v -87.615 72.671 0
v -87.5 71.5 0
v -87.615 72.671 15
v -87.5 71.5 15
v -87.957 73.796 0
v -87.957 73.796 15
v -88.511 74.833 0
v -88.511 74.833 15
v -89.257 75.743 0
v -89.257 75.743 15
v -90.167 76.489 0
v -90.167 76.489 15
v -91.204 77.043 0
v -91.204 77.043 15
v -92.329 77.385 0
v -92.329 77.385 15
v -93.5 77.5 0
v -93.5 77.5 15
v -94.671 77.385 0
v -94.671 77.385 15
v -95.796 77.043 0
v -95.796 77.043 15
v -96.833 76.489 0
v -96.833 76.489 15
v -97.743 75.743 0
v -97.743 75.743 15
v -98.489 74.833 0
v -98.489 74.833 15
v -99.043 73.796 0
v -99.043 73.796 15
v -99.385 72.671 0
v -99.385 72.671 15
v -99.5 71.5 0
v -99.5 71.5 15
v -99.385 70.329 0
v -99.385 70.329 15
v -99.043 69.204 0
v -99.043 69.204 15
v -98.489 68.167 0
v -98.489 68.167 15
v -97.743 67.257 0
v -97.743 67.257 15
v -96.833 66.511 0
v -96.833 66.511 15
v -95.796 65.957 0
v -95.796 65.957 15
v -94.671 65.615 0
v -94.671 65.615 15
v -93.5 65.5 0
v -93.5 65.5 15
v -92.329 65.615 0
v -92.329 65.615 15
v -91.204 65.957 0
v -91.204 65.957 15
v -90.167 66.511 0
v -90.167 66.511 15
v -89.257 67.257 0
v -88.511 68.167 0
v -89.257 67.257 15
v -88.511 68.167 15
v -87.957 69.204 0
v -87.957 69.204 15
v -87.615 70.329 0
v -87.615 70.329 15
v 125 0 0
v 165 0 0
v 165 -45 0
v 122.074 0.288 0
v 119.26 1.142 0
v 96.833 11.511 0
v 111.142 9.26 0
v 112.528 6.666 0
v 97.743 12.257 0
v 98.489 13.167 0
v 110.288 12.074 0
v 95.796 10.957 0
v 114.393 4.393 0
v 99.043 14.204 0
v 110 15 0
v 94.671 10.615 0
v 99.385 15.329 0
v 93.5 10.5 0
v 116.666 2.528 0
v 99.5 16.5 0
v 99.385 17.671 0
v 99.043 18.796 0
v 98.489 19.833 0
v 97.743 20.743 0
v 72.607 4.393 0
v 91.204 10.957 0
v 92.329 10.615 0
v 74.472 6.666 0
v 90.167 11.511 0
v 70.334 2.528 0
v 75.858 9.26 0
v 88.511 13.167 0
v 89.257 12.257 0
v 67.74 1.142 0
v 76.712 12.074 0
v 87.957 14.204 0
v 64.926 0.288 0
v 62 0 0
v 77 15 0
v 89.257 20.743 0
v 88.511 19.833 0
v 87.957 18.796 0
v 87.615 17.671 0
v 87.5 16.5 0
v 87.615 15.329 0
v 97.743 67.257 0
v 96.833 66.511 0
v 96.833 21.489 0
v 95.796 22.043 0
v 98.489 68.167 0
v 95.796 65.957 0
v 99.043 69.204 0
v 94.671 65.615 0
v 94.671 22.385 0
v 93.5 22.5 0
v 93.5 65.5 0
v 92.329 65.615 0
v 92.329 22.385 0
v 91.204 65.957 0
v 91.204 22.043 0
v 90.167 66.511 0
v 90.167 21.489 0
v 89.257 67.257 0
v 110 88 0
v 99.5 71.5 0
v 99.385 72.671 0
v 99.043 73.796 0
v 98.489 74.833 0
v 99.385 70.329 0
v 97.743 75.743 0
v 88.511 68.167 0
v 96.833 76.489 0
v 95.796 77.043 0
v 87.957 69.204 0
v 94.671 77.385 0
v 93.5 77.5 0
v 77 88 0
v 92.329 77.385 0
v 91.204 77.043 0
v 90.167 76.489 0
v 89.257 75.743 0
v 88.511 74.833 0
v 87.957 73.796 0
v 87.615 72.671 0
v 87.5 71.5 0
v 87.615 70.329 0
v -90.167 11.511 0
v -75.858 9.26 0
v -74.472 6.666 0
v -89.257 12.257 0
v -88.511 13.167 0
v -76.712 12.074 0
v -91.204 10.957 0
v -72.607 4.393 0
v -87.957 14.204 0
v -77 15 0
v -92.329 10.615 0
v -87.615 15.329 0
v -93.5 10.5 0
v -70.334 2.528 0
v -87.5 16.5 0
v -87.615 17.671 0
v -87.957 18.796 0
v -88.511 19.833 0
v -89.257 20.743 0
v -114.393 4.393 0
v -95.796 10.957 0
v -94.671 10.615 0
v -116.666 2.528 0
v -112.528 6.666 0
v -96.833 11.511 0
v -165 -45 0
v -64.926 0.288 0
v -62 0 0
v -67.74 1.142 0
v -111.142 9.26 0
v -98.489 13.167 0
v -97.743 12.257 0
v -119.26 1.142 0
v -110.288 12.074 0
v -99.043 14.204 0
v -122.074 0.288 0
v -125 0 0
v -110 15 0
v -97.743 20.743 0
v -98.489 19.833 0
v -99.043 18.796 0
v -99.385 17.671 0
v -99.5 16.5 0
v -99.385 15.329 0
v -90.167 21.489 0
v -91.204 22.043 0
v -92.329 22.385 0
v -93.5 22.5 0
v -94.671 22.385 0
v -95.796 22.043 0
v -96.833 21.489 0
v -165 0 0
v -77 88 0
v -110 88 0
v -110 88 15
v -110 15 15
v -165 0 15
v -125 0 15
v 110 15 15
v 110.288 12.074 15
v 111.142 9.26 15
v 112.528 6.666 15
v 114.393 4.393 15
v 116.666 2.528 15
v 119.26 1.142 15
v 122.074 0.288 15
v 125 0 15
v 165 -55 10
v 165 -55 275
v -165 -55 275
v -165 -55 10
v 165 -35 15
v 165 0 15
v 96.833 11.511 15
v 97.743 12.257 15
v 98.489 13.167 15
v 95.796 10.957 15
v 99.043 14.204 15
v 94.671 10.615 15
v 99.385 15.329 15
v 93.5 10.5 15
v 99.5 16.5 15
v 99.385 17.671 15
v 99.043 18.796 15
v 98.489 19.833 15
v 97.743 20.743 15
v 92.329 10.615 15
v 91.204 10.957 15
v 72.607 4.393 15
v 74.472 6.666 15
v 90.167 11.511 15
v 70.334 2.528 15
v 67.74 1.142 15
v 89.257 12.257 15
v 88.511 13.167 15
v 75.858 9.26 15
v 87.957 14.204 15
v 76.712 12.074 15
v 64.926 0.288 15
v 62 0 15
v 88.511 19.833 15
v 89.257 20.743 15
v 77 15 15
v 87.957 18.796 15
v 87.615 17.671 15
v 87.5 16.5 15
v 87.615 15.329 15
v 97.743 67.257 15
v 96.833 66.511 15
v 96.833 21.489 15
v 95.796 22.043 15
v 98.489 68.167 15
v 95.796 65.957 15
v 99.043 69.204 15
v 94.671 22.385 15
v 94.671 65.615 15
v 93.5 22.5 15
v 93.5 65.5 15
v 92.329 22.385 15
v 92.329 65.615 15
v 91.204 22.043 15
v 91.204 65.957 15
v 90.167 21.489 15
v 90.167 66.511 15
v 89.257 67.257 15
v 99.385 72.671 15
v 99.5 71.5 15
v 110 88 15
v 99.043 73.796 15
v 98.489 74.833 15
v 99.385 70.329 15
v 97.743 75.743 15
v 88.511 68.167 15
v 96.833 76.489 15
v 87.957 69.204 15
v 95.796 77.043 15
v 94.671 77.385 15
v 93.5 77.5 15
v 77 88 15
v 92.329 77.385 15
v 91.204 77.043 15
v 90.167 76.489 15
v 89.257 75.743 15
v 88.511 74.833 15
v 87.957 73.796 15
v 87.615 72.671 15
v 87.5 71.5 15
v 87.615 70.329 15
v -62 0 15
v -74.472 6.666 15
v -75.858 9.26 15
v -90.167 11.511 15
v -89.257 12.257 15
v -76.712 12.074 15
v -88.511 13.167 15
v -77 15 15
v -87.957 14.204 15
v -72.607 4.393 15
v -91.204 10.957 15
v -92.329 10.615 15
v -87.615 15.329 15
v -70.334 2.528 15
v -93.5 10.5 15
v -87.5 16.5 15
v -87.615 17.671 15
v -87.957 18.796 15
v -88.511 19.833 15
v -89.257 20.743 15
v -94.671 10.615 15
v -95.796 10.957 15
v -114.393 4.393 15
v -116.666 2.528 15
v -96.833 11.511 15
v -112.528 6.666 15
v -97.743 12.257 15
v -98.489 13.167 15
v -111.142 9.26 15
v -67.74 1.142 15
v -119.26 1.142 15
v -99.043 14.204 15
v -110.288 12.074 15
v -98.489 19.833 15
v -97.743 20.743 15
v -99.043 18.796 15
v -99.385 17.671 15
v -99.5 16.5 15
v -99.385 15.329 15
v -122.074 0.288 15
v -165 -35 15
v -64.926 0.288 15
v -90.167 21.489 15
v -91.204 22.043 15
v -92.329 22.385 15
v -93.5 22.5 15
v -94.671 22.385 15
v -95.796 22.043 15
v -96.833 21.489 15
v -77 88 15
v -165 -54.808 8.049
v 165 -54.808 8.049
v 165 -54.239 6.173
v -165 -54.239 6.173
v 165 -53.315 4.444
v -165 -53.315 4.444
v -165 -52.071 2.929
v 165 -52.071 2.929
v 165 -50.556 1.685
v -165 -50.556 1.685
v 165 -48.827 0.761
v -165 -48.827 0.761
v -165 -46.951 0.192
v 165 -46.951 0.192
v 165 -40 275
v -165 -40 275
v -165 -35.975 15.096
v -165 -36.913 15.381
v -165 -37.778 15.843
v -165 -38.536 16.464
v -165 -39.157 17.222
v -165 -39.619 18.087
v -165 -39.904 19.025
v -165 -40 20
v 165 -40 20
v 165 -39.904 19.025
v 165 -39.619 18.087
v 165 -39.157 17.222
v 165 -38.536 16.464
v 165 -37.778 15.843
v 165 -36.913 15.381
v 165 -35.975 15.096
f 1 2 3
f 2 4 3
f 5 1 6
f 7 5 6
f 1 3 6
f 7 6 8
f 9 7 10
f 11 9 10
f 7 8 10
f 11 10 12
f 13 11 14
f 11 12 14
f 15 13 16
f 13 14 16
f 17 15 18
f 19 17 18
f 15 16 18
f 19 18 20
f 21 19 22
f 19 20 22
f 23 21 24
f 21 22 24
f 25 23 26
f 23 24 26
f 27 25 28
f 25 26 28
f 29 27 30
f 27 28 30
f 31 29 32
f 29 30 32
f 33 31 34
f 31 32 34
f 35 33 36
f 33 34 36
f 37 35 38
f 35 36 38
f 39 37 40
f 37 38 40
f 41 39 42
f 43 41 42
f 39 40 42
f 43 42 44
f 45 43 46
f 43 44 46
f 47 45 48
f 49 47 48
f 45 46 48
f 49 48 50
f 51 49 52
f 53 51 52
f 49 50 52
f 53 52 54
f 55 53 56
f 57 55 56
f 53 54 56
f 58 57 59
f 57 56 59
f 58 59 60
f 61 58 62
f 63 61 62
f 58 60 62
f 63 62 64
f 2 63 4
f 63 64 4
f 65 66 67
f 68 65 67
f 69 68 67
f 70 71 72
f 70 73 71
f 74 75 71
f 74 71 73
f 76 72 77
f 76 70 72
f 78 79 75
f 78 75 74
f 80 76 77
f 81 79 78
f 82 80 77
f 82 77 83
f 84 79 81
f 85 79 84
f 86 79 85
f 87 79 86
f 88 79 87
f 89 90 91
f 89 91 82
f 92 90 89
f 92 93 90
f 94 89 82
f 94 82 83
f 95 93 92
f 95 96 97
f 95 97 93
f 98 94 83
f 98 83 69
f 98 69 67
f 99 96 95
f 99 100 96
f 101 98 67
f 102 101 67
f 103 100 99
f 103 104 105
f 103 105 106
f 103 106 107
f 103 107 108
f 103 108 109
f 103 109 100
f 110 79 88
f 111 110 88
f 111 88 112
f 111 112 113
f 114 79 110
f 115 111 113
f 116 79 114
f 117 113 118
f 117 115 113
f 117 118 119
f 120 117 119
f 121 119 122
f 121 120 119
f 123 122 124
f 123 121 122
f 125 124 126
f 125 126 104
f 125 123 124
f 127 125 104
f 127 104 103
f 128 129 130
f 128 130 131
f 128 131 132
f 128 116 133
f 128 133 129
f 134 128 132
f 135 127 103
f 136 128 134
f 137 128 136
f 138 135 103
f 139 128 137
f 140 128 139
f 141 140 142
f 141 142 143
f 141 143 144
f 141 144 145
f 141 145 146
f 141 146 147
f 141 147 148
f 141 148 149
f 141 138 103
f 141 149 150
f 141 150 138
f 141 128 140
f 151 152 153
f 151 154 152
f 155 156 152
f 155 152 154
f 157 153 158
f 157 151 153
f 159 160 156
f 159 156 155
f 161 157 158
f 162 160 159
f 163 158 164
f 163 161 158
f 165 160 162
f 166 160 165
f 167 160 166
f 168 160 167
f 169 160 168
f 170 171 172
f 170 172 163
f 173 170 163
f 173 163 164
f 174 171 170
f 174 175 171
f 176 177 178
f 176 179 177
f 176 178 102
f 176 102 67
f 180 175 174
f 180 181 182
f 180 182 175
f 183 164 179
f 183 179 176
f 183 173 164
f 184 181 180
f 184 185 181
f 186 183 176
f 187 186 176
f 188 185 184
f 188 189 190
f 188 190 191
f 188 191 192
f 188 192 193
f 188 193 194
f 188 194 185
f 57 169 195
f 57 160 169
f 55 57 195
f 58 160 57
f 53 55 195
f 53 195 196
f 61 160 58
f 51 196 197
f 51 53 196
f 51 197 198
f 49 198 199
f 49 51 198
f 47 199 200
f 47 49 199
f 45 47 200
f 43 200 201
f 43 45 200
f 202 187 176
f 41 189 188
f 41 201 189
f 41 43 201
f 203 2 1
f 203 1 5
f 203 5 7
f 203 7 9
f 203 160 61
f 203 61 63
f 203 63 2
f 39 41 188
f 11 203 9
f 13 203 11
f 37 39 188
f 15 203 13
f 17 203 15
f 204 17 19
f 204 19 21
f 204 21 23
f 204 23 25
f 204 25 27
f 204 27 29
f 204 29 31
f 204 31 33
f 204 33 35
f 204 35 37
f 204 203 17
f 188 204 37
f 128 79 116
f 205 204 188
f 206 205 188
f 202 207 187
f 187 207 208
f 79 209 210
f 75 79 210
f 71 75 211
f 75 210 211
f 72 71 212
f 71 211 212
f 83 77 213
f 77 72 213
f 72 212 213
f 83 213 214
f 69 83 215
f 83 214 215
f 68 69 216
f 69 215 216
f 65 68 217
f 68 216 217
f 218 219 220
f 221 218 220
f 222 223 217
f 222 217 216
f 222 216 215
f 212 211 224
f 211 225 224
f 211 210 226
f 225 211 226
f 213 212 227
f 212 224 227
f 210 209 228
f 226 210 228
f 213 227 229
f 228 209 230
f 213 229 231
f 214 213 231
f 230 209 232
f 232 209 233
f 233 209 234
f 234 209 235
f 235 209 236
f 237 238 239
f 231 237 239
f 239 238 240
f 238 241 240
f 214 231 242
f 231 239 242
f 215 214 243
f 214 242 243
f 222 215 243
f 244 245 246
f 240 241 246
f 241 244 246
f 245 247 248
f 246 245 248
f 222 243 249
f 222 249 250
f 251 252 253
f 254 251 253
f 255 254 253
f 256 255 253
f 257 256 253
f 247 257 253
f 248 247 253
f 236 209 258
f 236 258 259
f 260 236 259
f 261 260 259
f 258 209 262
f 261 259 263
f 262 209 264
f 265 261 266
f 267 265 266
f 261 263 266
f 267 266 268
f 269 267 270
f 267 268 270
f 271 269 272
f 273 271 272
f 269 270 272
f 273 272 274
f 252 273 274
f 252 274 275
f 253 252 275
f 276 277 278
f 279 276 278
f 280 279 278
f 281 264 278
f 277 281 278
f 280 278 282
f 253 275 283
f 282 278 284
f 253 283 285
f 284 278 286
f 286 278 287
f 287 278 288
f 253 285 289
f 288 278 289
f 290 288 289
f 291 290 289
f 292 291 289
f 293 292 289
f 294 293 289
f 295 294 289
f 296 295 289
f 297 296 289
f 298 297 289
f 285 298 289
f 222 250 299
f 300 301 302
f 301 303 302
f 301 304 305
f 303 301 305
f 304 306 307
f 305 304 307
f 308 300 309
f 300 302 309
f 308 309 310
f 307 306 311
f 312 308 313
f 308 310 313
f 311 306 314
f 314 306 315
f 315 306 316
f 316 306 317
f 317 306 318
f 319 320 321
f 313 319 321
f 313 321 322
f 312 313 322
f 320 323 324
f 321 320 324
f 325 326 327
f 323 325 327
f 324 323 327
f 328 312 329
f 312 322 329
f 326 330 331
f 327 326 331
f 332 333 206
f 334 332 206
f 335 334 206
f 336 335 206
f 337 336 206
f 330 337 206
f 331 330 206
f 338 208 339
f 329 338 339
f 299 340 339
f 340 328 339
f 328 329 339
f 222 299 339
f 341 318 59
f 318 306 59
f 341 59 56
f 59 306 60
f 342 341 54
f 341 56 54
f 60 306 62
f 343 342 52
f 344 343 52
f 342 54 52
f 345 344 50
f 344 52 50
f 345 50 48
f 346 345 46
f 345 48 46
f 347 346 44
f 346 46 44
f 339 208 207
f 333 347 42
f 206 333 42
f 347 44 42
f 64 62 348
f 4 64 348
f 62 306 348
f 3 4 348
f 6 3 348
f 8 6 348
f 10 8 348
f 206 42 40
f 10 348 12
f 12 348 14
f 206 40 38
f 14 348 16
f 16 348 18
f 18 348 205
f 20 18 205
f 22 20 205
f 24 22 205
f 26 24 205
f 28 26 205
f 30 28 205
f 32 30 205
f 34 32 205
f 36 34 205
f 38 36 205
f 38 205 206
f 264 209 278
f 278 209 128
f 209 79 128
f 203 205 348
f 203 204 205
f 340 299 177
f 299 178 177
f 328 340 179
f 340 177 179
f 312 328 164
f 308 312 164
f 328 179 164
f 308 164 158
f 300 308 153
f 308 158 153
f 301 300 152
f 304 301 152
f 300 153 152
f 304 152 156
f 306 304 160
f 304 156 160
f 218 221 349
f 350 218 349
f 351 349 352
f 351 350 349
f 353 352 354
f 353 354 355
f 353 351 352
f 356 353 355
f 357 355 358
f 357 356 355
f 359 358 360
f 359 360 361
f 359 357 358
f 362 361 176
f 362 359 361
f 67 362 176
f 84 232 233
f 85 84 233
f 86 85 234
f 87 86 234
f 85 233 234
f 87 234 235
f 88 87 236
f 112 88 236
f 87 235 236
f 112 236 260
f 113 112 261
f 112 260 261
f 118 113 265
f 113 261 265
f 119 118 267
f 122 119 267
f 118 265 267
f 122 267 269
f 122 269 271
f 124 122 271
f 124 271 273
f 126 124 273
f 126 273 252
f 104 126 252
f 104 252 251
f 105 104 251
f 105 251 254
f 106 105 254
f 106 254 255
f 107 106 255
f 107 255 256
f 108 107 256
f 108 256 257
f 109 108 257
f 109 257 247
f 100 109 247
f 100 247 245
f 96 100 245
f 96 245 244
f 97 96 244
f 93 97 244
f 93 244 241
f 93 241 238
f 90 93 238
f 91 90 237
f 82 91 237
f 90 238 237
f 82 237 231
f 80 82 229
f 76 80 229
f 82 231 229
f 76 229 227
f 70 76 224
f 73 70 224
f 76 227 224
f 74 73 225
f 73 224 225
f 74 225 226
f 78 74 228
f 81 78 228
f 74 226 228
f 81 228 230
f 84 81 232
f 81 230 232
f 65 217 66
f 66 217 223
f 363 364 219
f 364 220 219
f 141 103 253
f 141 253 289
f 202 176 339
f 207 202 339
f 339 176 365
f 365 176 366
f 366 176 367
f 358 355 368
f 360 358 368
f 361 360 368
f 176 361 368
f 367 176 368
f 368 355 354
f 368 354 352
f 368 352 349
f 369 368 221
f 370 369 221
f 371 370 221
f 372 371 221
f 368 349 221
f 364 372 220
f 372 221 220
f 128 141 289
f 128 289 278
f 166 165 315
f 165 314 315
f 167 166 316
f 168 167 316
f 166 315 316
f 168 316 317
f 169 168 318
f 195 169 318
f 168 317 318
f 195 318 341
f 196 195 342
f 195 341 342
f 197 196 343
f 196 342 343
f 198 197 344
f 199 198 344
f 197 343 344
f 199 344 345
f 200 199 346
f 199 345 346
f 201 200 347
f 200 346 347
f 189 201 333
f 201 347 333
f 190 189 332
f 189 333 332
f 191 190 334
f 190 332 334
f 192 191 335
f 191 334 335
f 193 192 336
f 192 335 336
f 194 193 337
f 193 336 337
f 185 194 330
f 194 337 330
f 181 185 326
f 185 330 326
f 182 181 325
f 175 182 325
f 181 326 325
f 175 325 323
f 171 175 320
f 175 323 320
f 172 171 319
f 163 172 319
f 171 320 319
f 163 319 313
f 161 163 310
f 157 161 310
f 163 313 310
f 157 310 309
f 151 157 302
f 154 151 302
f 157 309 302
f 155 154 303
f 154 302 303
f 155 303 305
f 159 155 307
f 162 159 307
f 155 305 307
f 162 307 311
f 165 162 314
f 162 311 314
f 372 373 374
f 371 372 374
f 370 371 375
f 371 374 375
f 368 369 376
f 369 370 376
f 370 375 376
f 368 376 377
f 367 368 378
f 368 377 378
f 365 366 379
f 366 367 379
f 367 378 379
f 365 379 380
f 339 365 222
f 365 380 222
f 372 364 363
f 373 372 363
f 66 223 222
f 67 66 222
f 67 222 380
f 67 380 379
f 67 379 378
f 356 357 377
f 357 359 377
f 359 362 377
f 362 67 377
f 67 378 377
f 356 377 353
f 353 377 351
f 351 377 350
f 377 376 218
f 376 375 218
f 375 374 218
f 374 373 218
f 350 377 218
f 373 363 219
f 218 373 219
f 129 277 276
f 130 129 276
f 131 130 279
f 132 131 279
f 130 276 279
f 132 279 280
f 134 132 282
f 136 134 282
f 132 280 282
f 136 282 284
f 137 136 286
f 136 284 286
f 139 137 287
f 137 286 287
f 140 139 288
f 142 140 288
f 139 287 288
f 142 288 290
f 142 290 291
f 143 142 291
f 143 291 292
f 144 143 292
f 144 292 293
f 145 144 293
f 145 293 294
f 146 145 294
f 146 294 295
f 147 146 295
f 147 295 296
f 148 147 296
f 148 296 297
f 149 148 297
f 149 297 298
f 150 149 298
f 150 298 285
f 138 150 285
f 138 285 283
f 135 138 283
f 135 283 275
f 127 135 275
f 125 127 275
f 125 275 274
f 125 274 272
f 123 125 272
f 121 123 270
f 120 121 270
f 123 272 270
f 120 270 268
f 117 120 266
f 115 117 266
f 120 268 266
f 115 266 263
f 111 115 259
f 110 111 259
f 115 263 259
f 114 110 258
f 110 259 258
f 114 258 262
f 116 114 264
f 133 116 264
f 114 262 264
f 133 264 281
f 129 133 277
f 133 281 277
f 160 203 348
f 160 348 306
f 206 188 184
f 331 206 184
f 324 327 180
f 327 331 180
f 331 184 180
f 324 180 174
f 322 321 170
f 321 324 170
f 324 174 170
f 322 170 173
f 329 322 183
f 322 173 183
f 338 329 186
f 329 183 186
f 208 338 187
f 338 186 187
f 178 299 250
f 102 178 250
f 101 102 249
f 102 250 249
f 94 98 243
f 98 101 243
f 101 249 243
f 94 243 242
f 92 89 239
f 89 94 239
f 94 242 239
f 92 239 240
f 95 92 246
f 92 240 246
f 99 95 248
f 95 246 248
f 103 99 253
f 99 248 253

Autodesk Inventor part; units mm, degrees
ref_plane "YZ Plane" through (0, 0, 0) normal (1, 0, 0) x (0, 1, 0)
ref_plane "XZ Plane" through (0, 0, 0) normal (0, 1, 0) x (-1, 0, 0)
ref_plane "XY Plane" through (0, 0, 0) normal (0, 0, 1) x (1, 0, 0)
sketch "草圖1" plane through (0, 0, 0) normal (0, 0, 1) x (1, 0, 0)
  line L0 (0, 0) -> (0, 117.5667) construction
  line L1 (-139.2449, 0) -> (139.2449, 0) construction
  line L2 (-110, 88) -> (-77, 88)
  line L3 (-77, 88) -> (-77, 0)
  line L4 (-77, 0) -> (-110, 0)
  line L5 (-110, 0) -> (-110, 88)
  line L6 (77, 88) -> (110, 88)
  line L7 (110, 88) -> (110, 0)
  line L8 (110, 0) -> (77, 0)
  line L9 (77, 0) -> (77, 88)
  line L10 (-110, 0) -> (-77, 0)
  line L11 (-77, 0) -> (-77, -55)
  line L12 (-77, -55) -> (-110, -55)
  line L13 (-110, -55) -> (-110, 0)
  line L14 (77, 0) -> (110, 0)
  line L15 (110, 0) -> (110, -55)
  line L16 (110, -55) -> (77, -55)
  line L17 (77, -55) -> (77, 0)
  dimension "d0" = 33
  dimension "d1" = 33
  dimension "d2" = 220
  dimension "d3" = 110
  dimension "d4" = 88
  dimension "d5" = 88
  dimension "d6" = 55
  dimension "d7" = 55
extrude "擠出1" add sketch "草圖1" along normal blind 15
sketch "草圖2" plane through (0, 0, 15) normal (0, 0, 1) x (1, 0, 0)
  line L0 (-77, -55) -> (-110, -55) construction
  line L1 (-110, -55) -> (-110, 88) construction
  line L2 (-110, 88) -> (-77, 88) construction
  line L3 (-77, 88) -> (-77, -55) construction
  line L4 (77, 88) -> (110, 88) construction
  line L5 (110, 88) -> (110, -55) construction
  line L6 (110, -55) -> (77, -55) construction
  line L7 (77, -55) -> (77, 88) construction
  line L8 (-110, -55) -> (110, -55)
  line L9 (110, -55) -> (110, -40)
  line L10 (110, -40) -> (-110, -40)
  line L11 (-110, -40) -> (-110, -55)
  point P0 (0, 0)
  dimension "d10" = 15
extrude "擠出2" add sketch "草圖2" along normal blind 260
sketch "草圖3" plane through (0, 0, 15) normal (0, 0, 1) x (1, 0, 0)
  circle A0 centre (-93.5, 71.5) radius 6
  circle A1 centre (-93.5, 16.5) radius 6
  circle A2 centre (93.5, 71.5) radius 6
  circle A3 centre (93.5, 16.5) radius 6
  line L0 (110, 88) -> (77, 88) construction
  line L1 (-77, 88) -> (-110, 88) construction
  line L2 (-93.5, 88) -> (-93.5, -40) construction
  line L3 (-110, -40) -> (-77, -40) construction
  line L4 (93.5, 88) -> (93.5, -40) construction
  line L5 (110, -40) -> (-110, -40) construction
  point P0 (0, 0)
  dimension "d13" = 55
  dimension "d14" = 12
  dimension "d15" = 12
  dimension "d16" = 12
  dimension "d17" = 12
  dimension "d18" = 55
  dimension "d19" = 16.5
  dimension "d20" = 16.5
extrude "擠出3" cut sketch "草圖3" against normal blind 200
sketch "草圖4" plane through (-110, -55, 0) normal (0, -1, 0) x (1, 0, 0)
  line L0 (187, 15) -> (33, 15) construction
  line L1 (33, 15) -> (33, 0) construction
  line L2 (33, 0) -> (0, 0) construction
  line L3 (0, 0) -> (0, 275) construction
  line L4 (0, 275) -> (220, 275) construction
  line L5 (220, 275) -> (220, 0) construction
  line L6 (220, 0) -> (187, 0) construction
  line L7 (187, 0) -> (187, 15) construction
  line L8 (-55, 275) -> (275, 275)
  line L9 (275, 275) -> (275, 15)
  line L10 (275, 15) -> (-55, 15)
  line L11 (-55, 15) -> (-55, 275)
  point P0 (110, 0)
  point P1 (110, 275)
  point P2 (110, 15)
  dimension "d23" = 55
extrude "擠出4" add sketch "草圖4" against normal blind 15
sketch "草圖5" plane through (0, 0, 15) normal (0, 0, -1) x (-1, 0, 0)
  circle A0 centre (-93.5, 71.5) radius 6 construction
  circle A1 centre (93.5, 71.5) radius 6 construction
  circle A2 centre (-93.5, 16.5) radius 6 construction
  circle A3 centre (93.5, 16.5) radius 6 construction
  line L0 (-110, 88) -> (-77, 88) construction
  line L1 (-77, 88) -> (-77, -40) construction
  line L2 (-77, -40) -> (77, -40) construction
  line L3 (77, -55) -> (77, -40) construction
  line L4 (77, -55) -> (-77, -55) construction
  line L5 (-77, -55) -> (-110, -55) construction
  line L6 (-110, -55) -> (-110, -40) construction
  line L7 (-110, -40) -> (-77, -40) construction
  line L8 (-110, -40) -> (-110, 88) construction
  line L9 (-165, -40) -> (-110, -40) construction
  line L10 (-165, -55) -> (-165, -40) construction
  line L11 (-110, -55) -> (-165, -55) construction
  line L12 (-77, -40) -> (-77, -55) construction
  line L13 (77, -40) -> (110, -40) construction
  line L14 (110, -40) -> (110, -55) construction
  line L15 (165, -55) -> (110, -55) construction
  line L16 (165, -40) -> (165, -55) construction
  line L17 (110, -40) -> (165, -40) construction
  line L18 (110, 88) -> (110, -40) construction
  line L19 (77, 88) -> (110, 88) construction
  line L20 (77, -40) -> (77, 88) construction
  line L21 (110, -55) -> (77, -55) construction
  line L22 (-165, -55) -> (165, -55)
  line L23 (165, -55) -> (165, 0)
  line L24 (165, 0) -> (-165, 0)
  line L25 (-165, 0) -> (-165, -55)
  line L26 (165, -55) -> (165, -40) projected
  point P0 (0, 0)
  dimension "d26" = 40
extrude "擠出5" add sketch "草圖5" along normal blind 15
fillet "圓角1" radius 10 1 edges at (0, -55, 0)
fillet "圓角2" radius 5 1 edges at (0, -40, 15)
fillet "圓角3" radius 15 4 edges at (-77, 0, 7.5) (-110, 0, 7.5) (77, 0, 7.5) (110, 0, 7.5)
equation "\"d3\" = 0.5 * d2"
equation "\"d15\" = d14"
equation "\"d16\" = d14"
equation "\"d17\" = d14"
equation "\"d18\" = d13"
equation "\"d20\" = d19"
